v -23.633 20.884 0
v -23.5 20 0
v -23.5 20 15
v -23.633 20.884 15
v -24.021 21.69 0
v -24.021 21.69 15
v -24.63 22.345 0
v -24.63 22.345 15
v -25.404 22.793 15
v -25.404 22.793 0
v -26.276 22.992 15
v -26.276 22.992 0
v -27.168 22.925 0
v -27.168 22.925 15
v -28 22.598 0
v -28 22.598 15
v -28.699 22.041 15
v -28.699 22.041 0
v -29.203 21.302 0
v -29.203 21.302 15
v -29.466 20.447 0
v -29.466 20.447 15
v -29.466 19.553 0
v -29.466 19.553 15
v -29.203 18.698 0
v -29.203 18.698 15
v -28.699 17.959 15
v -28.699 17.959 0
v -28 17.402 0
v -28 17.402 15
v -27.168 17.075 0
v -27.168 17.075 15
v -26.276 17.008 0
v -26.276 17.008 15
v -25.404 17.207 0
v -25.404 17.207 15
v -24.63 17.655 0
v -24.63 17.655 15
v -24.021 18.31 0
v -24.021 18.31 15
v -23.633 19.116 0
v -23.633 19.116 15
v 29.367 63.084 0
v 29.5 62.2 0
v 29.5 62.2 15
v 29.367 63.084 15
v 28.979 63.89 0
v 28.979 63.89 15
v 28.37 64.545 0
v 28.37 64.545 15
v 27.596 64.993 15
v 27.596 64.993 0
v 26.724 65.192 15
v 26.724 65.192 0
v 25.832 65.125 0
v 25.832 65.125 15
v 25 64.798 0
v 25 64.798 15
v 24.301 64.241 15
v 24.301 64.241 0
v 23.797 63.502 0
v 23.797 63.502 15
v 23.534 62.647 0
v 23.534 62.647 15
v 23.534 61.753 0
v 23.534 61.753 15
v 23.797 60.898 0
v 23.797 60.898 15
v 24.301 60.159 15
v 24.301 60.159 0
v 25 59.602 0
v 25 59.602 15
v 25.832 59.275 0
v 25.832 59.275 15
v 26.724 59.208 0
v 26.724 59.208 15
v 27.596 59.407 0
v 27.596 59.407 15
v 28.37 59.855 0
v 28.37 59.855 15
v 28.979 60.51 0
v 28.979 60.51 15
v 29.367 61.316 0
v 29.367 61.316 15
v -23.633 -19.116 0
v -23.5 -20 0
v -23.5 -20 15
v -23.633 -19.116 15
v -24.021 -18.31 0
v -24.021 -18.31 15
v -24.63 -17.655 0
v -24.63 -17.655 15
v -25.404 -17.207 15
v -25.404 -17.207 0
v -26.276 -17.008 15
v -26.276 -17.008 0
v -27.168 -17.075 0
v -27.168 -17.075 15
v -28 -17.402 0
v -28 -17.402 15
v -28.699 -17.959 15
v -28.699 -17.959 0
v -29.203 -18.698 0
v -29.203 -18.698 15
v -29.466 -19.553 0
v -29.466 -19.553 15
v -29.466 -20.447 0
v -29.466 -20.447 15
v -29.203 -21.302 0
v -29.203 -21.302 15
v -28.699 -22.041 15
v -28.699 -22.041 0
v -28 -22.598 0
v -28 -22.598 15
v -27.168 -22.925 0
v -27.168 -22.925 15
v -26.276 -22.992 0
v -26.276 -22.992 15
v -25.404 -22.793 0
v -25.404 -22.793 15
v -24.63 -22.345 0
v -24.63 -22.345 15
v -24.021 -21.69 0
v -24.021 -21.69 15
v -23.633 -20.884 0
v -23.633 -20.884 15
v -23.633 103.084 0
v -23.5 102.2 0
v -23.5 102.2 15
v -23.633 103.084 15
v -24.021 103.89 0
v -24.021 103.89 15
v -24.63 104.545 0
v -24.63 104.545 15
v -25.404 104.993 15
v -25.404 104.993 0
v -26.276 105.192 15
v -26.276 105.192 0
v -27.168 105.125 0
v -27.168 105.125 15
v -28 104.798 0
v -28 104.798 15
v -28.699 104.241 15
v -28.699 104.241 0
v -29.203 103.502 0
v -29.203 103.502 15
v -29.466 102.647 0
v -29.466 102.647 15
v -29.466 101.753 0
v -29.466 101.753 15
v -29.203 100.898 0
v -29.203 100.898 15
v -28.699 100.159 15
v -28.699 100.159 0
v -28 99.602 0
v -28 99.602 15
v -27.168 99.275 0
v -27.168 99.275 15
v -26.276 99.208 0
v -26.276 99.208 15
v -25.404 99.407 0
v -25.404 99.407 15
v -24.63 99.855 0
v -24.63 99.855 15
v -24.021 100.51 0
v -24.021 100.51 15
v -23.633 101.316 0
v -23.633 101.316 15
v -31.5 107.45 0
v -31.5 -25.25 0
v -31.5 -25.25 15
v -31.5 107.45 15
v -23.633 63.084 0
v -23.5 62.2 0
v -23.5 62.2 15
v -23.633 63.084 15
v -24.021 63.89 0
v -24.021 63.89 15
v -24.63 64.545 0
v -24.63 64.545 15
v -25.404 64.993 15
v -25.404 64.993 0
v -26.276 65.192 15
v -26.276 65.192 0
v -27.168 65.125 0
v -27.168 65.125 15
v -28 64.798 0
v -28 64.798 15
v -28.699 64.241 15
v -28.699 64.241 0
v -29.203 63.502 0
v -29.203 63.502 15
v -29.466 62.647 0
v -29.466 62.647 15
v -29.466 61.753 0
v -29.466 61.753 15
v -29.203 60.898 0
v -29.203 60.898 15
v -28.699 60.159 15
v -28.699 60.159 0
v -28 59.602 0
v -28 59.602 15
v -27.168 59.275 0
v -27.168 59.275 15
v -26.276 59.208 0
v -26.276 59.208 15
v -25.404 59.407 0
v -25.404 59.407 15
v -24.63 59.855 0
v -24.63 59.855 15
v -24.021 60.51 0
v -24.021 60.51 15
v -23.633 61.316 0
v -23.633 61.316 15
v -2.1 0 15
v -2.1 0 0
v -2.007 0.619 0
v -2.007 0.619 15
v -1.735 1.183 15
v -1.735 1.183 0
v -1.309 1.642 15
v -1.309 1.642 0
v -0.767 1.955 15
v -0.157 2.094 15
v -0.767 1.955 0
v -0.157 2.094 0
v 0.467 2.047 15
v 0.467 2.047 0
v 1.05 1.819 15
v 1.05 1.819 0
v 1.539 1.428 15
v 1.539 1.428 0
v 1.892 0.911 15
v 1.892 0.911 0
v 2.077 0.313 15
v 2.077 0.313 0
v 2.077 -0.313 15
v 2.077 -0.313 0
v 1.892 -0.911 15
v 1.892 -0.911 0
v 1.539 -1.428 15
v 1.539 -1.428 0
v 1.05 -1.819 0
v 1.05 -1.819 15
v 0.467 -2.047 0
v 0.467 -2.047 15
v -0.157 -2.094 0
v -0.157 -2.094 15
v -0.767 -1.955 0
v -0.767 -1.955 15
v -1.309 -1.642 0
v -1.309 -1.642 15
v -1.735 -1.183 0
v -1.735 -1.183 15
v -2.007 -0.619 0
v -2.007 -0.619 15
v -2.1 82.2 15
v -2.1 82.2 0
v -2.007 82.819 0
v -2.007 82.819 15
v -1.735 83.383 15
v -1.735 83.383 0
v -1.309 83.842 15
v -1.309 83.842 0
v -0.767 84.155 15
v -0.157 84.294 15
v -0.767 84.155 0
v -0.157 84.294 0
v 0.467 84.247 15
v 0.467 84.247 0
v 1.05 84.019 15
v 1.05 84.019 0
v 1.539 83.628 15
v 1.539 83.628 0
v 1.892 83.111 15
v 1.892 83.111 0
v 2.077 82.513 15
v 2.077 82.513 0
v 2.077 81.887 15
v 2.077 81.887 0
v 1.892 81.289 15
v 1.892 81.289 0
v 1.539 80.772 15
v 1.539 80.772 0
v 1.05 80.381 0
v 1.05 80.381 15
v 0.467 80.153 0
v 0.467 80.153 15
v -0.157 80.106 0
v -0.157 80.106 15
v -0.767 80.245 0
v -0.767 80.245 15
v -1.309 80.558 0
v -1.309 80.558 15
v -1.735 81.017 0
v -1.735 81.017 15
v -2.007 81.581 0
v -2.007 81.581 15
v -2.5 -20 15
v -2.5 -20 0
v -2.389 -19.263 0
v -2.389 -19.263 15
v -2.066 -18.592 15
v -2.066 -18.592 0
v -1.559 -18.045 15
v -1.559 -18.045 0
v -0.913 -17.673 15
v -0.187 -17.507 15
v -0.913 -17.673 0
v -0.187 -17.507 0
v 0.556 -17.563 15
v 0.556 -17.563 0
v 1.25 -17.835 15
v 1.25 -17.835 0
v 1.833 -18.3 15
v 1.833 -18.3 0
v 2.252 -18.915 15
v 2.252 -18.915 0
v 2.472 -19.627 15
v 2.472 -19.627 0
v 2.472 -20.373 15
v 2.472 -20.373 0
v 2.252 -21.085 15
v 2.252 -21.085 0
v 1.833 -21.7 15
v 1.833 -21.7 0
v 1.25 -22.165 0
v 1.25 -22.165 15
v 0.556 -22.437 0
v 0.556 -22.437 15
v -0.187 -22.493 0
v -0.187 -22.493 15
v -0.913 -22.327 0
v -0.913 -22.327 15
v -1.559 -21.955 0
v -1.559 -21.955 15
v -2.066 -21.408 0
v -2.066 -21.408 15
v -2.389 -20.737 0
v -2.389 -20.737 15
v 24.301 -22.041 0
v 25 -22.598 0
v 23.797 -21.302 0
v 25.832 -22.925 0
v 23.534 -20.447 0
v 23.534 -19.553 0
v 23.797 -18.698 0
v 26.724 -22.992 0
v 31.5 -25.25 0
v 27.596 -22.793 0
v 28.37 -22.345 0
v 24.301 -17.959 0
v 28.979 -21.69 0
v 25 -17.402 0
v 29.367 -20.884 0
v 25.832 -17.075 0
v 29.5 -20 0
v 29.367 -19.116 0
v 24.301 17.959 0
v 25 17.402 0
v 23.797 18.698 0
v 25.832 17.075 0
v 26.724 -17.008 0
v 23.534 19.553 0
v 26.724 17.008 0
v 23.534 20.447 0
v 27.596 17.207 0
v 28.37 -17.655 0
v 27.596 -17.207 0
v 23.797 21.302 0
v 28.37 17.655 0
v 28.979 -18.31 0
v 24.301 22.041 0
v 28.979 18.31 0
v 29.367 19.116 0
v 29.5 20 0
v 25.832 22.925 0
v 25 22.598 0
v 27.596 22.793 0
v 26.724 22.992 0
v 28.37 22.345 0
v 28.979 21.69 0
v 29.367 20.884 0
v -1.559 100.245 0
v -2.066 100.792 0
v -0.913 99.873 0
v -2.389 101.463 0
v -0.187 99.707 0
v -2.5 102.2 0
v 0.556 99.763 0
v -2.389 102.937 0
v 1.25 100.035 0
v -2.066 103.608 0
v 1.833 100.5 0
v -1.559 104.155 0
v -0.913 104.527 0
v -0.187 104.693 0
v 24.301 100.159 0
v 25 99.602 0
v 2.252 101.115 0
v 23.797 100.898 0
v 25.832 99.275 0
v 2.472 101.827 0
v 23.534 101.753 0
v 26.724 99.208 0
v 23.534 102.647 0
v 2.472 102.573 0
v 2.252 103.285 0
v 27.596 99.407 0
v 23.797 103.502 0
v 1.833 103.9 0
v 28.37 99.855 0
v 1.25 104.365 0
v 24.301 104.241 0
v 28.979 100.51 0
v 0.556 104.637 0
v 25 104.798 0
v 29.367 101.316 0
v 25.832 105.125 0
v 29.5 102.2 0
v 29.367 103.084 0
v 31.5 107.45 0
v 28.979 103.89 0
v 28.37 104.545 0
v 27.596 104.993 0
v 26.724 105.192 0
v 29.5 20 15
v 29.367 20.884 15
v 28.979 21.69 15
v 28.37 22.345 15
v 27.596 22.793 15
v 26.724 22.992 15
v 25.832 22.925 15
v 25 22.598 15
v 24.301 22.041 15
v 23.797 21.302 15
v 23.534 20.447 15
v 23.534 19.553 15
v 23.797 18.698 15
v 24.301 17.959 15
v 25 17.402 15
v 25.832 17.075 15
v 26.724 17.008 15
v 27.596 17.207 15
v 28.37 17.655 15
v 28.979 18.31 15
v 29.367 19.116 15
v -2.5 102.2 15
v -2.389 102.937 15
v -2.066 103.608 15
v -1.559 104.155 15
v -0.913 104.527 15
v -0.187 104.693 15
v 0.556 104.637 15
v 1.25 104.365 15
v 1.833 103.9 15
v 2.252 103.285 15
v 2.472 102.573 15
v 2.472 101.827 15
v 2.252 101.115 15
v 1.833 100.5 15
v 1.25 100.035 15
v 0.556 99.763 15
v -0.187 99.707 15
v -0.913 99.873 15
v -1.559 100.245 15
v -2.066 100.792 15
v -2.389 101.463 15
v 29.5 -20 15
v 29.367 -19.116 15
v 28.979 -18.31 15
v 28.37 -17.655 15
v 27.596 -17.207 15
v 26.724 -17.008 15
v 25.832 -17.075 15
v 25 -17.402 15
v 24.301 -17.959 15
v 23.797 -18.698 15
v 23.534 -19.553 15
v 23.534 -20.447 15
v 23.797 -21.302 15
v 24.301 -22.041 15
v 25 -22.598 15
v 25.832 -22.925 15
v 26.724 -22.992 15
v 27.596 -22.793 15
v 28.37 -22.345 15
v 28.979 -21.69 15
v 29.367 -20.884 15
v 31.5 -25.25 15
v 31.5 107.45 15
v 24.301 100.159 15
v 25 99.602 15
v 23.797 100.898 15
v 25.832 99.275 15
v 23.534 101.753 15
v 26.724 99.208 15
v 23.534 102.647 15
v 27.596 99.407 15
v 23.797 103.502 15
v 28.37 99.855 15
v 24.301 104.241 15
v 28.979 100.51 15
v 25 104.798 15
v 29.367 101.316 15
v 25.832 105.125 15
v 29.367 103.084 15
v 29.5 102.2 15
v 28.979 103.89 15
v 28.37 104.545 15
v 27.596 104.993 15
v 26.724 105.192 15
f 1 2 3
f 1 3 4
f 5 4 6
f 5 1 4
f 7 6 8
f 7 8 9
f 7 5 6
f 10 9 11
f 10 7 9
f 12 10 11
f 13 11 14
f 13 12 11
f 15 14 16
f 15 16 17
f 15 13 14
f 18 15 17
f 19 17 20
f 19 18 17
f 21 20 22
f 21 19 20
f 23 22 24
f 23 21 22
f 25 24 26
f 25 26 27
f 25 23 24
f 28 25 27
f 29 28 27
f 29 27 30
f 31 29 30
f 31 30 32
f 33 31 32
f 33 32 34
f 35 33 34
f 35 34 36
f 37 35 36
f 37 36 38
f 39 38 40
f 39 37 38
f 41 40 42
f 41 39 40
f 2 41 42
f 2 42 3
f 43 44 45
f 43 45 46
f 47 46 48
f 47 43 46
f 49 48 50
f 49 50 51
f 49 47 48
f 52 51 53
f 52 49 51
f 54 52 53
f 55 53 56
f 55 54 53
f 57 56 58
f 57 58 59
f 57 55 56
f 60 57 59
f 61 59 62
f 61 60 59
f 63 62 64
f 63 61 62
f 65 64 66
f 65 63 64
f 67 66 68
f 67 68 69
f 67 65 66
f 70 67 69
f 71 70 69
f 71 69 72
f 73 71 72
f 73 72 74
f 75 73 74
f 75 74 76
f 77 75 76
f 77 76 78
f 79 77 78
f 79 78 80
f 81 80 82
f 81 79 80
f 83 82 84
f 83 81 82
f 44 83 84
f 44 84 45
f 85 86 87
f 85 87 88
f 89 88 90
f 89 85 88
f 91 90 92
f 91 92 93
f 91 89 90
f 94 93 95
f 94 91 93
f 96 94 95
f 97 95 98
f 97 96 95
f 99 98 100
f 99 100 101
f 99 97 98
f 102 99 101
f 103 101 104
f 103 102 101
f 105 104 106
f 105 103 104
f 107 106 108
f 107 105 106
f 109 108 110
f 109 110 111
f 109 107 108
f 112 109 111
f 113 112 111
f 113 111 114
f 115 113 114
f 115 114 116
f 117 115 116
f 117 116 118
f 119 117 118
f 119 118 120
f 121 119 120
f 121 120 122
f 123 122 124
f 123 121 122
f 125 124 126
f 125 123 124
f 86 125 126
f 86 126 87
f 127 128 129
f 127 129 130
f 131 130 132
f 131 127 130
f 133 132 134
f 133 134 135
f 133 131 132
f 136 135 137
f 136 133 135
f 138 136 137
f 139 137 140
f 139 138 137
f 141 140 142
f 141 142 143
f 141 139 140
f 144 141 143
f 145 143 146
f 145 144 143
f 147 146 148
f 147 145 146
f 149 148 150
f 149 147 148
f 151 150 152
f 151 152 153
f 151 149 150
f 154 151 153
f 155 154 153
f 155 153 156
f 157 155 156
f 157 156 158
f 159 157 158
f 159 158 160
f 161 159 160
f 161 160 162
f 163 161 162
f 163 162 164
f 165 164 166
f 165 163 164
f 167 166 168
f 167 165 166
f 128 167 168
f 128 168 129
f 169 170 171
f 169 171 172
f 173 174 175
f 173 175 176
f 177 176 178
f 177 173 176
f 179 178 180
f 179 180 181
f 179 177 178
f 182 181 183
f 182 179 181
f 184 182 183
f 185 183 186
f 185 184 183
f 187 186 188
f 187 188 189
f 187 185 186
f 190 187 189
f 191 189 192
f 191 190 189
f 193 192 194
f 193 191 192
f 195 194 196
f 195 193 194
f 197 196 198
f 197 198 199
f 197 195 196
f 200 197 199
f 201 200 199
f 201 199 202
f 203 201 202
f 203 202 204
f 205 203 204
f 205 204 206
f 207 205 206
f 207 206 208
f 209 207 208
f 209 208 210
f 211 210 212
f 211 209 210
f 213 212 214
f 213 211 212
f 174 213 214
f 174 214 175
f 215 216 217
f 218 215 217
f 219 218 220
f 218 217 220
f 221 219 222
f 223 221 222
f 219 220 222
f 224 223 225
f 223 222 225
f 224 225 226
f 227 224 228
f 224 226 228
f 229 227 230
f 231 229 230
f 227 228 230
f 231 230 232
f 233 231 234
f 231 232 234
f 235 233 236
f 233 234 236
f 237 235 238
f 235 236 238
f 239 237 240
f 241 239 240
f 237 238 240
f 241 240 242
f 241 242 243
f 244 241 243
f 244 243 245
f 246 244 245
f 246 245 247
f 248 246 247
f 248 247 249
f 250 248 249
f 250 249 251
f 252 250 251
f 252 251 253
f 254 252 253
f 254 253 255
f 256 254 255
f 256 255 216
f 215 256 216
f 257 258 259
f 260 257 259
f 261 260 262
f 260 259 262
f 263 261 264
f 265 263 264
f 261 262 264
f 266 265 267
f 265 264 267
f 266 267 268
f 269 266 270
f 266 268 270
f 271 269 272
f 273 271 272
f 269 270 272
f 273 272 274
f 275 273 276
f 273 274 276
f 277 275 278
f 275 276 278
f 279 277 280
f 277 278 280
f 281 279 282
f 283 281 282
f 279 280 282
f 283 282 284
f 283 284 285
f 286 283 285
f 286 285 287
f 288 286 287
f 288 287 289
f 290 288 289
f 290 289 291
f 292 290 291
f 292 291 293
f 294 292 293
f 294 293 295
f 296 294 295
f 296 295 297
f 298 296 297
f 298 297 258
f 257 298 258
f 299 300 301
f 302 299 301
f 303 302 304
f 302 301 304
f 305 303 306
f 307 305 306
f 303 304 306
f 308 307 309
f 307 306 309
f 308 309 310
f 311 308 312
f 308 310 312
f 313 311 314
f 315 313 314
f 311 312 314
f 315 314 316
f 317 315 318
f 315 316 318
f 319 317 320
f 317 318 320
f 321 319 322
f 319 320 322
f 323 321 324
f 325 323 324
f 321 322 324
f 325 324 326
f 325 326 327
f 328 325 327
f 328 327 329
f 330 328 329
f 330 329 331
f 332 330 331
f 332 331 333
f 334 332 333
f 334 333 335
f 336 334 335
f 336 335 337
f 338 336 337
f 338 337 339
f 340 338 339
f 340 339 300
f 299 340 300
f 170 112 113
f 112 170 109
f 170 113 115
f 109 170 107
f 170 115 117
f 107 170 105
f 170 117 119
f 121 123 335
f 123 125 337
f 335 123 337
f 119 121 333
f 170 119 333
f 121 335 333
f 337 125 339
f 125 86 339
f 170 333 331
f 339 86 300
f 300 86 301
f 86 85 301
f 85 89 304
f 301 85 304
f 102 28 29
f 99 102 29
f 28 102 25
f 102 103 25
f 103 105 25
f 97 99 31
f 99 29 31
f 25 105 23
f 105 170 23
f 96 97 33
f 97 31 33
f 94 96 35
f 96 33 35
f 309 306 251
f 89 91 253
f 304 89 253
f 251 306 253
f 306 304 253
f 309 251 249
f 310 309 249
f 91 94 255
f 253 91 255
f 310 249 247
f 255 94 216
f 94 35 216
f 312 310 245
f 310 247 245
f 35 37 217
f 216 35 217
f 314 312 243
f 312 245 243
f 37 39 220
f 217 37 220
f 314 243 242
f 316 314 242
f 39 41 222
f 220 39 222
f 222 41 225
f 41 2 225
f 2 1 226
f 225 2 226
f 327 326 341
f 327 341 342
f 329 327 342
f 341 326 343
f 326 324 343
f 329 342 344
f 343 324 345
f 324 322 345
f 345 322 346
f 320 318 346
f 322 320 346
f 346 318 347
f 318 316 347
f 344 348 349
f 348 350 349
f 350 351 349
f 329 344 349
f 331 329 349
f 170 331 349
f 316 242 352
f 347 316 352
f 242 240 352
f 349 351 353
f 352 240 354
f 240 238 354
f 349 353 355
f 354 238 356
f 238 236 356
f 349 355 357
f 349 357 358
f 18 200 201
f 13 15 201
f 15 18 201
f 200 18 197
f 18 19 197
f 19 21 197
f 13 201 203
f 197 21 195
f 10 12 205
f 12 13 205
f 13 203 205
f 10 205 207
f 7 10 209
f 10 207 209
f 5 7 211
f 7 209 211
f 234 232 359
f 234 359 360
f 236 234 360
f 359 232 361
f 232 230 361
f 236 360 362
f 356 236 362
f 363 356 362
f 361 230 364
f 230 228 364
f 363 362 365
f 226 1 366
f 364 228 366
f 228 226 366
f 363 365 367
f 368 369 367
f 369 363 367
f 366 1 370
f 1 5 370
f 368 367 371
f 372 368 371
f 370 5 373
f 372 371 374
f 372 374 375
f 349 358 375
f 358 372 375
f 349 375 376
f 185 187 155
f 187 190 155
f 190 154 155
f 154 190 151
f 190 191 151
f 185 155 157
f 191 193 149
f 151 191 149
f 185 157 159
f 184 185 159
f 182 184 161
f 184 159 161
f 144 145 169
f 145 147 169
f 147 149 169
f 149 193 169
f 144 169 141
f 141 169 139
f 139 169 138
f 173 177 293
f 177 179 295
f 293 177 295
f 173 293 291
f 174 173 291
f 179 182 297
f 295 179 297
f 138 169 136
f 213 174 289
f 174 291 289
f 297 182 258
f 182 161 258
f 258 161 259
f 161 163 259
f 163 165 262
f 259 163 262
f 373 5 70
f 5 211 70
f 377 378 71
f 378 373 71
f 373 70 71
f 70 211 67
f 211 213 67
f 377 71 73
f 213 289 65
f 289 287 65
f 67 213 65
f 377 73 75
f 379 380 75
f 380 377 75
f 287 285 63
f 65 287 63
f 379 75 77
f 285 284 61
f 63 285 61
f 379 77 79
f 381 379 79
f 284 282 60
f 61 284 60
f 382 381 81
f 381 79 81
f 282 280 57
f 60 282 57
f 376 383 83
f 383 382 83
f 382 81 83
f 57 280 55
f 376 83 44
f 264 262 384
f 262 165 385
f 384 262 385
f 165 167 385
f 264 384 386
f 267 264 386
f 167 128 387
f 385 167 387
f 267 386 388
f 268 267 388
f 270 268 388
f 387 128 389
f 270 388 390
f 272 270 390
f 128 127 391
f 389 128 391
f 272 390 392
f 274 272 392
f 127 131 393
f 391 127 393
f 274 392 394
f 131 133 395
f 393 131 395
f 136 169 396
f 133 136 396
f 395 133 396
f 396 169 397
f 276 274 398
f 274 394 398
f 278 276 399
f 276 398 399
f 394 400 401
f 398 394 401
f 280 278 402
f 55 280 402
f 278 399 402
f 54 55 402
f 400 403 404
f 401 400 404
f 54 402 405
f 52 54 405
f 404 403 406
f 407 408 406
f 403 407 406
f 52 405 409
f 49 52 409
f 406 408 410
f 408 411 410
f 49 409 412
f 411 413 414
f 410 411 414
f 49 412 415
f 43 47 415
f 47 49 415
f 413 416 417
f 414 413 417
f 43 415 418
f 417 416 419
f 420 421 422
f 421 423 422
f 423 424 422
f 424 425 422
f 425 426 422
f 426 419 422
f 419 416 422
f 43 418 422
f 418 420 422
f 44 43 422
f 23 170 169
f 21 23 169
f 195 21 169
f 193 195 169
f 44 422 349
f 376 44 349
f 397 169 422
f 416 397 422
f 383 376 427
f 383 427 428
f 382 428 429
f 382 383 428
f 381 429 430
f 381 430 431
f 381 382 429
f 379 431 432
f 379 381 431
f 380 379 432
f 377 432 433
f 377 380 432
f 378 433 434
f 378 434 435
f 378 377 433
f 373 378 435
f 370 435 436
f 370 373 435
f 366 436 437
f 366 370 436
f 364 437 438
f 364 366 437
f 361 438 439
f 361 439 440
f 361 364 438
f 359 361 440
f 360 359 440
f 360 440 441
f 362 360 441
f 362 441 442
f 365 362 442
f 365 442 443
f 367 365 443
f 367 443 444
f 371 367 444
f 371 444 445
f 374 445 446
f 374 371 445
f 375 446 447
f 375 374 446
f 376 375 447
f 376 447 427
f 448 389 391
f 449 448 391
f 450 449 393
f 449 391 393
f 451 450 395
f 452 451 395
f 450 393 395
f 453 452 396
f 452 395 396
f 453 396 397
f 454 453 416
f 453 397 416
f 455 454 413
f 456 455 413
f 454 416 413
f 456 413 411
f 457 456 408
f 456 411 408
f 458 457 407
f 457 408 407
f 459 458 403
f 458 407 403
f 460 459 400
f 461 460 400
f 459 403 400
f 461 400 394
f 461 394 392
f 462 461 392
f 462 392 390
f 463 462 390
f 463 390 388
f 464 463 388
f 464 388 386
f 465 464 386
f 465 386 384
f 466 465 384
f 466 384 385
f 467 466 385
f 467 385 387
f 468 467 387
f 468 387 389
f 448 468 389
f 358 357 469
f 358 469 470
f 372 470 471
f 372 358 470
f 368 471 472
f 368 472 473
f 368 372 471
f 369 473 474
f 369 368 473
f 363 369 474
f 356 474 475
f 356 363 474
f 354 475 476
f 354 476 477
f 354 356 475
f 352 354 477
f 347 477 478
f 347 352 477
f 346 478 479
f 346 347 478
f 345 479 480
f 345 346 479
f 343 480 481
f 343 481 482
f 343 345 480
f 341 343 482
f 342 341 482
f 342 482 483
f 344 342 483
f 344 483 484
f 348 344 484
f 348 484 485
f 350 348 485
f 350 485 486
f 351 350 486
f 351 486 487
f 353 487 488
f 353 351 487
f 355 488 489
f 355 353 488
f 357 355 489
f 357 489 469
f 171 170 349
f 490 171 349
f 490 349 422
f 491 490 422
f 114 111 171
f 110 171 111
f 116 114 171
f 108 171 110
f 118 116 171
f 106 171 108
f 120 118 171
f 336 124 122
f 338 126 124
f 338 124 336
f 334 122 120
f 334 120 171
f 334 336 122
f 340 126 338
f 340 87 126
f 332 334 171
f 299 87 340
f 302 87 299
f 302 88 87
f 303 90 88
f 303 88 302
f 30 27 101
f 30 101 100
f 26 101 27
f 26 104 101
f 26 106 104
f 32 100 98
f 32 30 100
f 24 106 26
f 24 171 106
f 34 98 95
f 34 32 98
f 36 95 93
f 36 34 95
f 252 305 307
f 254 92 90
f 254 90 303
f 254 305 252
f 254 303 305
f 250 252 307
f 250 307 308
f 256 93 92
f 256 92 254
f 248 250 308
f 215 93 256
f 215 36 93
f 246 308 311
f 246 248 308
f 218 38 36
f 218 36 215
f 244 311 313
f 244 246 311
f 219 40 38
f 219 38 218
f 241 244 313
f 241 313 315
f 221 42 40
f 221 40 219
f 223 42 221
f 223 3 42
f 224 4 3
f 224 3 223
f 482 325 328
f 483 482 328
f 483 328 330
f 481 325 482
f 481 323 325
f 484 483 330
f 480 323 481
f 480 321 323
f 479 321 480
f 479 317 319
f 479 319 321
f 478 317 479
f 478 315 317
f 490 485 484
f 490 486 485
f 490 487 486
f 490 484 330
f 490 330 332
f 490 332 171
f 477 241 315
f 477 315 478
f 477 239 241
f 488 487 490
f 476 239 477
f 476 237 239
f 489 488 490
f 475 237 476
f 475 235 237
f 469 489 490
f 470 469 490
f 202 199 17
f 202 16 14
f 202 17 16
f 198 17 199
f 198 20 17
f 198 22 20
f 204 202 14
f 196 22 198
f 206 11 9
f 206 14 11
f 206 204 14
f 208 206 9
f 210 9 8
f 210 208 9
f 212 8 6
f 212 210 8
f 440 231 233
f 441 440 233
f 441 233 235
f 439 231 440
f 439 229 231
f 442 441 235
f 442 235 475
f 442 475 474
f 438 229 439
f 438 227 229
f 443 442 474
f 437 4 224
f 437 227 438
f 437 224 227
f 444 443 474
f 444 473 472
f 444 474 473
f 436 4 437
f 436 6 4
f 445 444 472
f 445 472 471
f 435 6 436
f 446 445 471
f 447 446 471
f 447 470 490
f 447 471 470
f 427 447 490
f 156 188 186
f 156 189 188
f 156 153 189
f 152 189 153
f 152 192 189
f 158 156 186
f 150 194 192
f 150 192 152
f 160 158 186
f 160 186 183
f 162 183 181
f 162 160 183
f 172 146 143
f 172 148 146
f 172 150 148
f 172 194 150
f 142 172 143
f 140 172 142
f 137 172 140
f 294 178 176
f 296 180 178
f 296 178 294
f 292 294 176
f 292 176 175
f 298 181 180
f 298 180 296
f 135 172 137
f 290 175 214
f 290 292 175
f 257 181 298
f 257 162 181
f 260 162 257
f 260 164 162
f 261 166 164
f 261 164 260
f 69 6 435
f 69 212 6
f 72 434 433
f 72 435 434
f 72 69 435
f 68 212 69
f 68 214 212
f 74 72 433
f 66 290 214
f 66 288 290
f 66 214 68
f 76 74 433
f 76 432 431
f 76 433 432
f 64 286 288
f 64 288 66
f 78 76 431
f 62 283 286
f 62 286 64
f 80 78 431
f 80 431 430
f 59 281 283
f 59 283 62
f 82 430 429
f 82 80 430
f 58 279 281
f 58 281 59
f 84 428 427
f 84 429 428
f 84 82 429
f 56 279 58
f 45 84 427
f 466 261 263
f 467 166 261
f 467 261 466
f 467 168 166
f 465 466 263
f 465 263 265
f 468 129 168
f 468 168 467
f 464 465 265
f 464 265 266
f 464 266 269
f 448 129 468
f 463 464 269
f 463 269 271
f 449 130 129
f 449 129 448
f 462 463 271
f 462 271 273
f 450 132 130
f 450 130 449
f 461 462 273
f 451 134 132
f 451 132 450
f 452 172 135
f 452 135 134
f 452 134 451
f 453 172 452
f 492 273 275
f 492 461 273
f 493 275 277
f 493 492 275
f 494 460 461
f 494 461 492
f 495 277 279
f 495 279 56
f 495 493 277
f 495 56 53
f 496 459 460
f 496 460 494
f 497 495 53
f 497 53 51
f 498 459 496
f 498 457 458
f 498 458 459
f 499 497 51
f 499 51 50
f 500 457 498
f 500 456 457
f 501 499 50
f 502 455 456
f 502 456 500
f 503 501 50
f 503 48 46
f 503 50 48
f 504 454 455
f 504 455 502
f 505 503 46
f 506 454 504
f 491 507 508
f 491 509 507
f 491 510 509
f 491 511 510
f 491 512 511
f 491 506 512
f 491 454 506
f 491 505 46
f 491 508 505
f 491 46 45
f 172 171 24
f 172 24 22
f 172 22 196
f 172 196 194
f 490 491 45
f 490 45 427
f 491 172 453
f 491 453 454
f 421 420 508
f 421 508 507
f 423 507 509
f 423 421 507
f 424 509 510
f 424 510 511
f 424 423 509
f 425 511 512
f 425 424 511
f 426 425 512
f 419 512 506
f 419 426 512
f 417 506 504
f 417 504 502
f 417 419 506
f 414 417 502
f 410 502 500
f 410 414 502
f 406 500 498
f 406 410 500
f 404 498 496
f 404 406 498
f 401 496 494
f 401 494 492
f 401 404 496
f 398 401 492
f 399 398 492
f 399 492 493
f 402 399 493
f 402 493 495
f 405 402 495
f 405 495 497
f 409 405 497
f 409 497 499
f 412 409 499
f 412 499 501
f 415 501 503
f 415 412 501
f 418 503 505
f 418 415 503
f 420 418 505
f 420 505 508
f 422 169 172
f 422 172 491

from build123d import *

# Parameters (mm, degrees)
SKETCH1_W           = 63
SKETCH1_H           = 132.7
SKETCH1_R           = 3
BOSS_EXTRUDE1_DEPTH = 15
SETSCREWS_D         = 4.2
SCREWHOLES_D        = 5


with BuildPart() as part:
    # Sketch1 → Boss-Extrude1 (new body)
    with BuildSketch(Plane.XY):
        with Locations((0, 41.1)):
            Rectangle(SKETCH1_W, SKETCH1_H)
        with Locations((-26.5, 20)):
            Circle(SKETCH1_R, mode=Mode.SUBTRACT)
        with Locations((-26.5, -20)):
            Circle(SKETCH1_R, mode=Mode.SUBTRACT)
        with Locations((26.5, -20)):
            Circle(SKETCH1_R, mode=Mode.SUBTRACT)
        with Locations((26.5, 20)):
            Circle(SKETCH1_R, mode=Mode.SUBTRACT)
        with Locations((-26.5, 102.2)):
            Circle(SKETCH1_R, mode=Mode.SUBTRACT)
        with Locations((-26.5, 62.2)):
            Circle(SKETCH1_R, mode=Mode.SUBTRACT)
        with Locations((26.5, 62.2)):
            Circle(SKETCH1_R, mode=Mode.SUBTRACT)
        with Locations((26.5, 102.2)):
            Circle(SKETCH1_R, mode=Mode.SUBTRACT)
    extrude(amount=BOSS_EXTRUDE1_DEPTH)

    # setscrews (through all)
    with Locations(Plane(origin=(0, 82.2, 15), x_dir=(1, 0, 0), z_dir=(0, 0, 1))):
        with Locations((0, 0), (0, -82.2)):
            Hole(SETSCREWS_D / 2)

    # screwHoles (through all)
    with Locations(Plane(origin=(0, 102.2, 15), x_dir=(1, 0, 0), z_dir=(0, 0, 1))):
        with Locations((0, 0), (0, -122.2)):
            Hole(SCREWHOLES_D / 2)


solid = part.part
